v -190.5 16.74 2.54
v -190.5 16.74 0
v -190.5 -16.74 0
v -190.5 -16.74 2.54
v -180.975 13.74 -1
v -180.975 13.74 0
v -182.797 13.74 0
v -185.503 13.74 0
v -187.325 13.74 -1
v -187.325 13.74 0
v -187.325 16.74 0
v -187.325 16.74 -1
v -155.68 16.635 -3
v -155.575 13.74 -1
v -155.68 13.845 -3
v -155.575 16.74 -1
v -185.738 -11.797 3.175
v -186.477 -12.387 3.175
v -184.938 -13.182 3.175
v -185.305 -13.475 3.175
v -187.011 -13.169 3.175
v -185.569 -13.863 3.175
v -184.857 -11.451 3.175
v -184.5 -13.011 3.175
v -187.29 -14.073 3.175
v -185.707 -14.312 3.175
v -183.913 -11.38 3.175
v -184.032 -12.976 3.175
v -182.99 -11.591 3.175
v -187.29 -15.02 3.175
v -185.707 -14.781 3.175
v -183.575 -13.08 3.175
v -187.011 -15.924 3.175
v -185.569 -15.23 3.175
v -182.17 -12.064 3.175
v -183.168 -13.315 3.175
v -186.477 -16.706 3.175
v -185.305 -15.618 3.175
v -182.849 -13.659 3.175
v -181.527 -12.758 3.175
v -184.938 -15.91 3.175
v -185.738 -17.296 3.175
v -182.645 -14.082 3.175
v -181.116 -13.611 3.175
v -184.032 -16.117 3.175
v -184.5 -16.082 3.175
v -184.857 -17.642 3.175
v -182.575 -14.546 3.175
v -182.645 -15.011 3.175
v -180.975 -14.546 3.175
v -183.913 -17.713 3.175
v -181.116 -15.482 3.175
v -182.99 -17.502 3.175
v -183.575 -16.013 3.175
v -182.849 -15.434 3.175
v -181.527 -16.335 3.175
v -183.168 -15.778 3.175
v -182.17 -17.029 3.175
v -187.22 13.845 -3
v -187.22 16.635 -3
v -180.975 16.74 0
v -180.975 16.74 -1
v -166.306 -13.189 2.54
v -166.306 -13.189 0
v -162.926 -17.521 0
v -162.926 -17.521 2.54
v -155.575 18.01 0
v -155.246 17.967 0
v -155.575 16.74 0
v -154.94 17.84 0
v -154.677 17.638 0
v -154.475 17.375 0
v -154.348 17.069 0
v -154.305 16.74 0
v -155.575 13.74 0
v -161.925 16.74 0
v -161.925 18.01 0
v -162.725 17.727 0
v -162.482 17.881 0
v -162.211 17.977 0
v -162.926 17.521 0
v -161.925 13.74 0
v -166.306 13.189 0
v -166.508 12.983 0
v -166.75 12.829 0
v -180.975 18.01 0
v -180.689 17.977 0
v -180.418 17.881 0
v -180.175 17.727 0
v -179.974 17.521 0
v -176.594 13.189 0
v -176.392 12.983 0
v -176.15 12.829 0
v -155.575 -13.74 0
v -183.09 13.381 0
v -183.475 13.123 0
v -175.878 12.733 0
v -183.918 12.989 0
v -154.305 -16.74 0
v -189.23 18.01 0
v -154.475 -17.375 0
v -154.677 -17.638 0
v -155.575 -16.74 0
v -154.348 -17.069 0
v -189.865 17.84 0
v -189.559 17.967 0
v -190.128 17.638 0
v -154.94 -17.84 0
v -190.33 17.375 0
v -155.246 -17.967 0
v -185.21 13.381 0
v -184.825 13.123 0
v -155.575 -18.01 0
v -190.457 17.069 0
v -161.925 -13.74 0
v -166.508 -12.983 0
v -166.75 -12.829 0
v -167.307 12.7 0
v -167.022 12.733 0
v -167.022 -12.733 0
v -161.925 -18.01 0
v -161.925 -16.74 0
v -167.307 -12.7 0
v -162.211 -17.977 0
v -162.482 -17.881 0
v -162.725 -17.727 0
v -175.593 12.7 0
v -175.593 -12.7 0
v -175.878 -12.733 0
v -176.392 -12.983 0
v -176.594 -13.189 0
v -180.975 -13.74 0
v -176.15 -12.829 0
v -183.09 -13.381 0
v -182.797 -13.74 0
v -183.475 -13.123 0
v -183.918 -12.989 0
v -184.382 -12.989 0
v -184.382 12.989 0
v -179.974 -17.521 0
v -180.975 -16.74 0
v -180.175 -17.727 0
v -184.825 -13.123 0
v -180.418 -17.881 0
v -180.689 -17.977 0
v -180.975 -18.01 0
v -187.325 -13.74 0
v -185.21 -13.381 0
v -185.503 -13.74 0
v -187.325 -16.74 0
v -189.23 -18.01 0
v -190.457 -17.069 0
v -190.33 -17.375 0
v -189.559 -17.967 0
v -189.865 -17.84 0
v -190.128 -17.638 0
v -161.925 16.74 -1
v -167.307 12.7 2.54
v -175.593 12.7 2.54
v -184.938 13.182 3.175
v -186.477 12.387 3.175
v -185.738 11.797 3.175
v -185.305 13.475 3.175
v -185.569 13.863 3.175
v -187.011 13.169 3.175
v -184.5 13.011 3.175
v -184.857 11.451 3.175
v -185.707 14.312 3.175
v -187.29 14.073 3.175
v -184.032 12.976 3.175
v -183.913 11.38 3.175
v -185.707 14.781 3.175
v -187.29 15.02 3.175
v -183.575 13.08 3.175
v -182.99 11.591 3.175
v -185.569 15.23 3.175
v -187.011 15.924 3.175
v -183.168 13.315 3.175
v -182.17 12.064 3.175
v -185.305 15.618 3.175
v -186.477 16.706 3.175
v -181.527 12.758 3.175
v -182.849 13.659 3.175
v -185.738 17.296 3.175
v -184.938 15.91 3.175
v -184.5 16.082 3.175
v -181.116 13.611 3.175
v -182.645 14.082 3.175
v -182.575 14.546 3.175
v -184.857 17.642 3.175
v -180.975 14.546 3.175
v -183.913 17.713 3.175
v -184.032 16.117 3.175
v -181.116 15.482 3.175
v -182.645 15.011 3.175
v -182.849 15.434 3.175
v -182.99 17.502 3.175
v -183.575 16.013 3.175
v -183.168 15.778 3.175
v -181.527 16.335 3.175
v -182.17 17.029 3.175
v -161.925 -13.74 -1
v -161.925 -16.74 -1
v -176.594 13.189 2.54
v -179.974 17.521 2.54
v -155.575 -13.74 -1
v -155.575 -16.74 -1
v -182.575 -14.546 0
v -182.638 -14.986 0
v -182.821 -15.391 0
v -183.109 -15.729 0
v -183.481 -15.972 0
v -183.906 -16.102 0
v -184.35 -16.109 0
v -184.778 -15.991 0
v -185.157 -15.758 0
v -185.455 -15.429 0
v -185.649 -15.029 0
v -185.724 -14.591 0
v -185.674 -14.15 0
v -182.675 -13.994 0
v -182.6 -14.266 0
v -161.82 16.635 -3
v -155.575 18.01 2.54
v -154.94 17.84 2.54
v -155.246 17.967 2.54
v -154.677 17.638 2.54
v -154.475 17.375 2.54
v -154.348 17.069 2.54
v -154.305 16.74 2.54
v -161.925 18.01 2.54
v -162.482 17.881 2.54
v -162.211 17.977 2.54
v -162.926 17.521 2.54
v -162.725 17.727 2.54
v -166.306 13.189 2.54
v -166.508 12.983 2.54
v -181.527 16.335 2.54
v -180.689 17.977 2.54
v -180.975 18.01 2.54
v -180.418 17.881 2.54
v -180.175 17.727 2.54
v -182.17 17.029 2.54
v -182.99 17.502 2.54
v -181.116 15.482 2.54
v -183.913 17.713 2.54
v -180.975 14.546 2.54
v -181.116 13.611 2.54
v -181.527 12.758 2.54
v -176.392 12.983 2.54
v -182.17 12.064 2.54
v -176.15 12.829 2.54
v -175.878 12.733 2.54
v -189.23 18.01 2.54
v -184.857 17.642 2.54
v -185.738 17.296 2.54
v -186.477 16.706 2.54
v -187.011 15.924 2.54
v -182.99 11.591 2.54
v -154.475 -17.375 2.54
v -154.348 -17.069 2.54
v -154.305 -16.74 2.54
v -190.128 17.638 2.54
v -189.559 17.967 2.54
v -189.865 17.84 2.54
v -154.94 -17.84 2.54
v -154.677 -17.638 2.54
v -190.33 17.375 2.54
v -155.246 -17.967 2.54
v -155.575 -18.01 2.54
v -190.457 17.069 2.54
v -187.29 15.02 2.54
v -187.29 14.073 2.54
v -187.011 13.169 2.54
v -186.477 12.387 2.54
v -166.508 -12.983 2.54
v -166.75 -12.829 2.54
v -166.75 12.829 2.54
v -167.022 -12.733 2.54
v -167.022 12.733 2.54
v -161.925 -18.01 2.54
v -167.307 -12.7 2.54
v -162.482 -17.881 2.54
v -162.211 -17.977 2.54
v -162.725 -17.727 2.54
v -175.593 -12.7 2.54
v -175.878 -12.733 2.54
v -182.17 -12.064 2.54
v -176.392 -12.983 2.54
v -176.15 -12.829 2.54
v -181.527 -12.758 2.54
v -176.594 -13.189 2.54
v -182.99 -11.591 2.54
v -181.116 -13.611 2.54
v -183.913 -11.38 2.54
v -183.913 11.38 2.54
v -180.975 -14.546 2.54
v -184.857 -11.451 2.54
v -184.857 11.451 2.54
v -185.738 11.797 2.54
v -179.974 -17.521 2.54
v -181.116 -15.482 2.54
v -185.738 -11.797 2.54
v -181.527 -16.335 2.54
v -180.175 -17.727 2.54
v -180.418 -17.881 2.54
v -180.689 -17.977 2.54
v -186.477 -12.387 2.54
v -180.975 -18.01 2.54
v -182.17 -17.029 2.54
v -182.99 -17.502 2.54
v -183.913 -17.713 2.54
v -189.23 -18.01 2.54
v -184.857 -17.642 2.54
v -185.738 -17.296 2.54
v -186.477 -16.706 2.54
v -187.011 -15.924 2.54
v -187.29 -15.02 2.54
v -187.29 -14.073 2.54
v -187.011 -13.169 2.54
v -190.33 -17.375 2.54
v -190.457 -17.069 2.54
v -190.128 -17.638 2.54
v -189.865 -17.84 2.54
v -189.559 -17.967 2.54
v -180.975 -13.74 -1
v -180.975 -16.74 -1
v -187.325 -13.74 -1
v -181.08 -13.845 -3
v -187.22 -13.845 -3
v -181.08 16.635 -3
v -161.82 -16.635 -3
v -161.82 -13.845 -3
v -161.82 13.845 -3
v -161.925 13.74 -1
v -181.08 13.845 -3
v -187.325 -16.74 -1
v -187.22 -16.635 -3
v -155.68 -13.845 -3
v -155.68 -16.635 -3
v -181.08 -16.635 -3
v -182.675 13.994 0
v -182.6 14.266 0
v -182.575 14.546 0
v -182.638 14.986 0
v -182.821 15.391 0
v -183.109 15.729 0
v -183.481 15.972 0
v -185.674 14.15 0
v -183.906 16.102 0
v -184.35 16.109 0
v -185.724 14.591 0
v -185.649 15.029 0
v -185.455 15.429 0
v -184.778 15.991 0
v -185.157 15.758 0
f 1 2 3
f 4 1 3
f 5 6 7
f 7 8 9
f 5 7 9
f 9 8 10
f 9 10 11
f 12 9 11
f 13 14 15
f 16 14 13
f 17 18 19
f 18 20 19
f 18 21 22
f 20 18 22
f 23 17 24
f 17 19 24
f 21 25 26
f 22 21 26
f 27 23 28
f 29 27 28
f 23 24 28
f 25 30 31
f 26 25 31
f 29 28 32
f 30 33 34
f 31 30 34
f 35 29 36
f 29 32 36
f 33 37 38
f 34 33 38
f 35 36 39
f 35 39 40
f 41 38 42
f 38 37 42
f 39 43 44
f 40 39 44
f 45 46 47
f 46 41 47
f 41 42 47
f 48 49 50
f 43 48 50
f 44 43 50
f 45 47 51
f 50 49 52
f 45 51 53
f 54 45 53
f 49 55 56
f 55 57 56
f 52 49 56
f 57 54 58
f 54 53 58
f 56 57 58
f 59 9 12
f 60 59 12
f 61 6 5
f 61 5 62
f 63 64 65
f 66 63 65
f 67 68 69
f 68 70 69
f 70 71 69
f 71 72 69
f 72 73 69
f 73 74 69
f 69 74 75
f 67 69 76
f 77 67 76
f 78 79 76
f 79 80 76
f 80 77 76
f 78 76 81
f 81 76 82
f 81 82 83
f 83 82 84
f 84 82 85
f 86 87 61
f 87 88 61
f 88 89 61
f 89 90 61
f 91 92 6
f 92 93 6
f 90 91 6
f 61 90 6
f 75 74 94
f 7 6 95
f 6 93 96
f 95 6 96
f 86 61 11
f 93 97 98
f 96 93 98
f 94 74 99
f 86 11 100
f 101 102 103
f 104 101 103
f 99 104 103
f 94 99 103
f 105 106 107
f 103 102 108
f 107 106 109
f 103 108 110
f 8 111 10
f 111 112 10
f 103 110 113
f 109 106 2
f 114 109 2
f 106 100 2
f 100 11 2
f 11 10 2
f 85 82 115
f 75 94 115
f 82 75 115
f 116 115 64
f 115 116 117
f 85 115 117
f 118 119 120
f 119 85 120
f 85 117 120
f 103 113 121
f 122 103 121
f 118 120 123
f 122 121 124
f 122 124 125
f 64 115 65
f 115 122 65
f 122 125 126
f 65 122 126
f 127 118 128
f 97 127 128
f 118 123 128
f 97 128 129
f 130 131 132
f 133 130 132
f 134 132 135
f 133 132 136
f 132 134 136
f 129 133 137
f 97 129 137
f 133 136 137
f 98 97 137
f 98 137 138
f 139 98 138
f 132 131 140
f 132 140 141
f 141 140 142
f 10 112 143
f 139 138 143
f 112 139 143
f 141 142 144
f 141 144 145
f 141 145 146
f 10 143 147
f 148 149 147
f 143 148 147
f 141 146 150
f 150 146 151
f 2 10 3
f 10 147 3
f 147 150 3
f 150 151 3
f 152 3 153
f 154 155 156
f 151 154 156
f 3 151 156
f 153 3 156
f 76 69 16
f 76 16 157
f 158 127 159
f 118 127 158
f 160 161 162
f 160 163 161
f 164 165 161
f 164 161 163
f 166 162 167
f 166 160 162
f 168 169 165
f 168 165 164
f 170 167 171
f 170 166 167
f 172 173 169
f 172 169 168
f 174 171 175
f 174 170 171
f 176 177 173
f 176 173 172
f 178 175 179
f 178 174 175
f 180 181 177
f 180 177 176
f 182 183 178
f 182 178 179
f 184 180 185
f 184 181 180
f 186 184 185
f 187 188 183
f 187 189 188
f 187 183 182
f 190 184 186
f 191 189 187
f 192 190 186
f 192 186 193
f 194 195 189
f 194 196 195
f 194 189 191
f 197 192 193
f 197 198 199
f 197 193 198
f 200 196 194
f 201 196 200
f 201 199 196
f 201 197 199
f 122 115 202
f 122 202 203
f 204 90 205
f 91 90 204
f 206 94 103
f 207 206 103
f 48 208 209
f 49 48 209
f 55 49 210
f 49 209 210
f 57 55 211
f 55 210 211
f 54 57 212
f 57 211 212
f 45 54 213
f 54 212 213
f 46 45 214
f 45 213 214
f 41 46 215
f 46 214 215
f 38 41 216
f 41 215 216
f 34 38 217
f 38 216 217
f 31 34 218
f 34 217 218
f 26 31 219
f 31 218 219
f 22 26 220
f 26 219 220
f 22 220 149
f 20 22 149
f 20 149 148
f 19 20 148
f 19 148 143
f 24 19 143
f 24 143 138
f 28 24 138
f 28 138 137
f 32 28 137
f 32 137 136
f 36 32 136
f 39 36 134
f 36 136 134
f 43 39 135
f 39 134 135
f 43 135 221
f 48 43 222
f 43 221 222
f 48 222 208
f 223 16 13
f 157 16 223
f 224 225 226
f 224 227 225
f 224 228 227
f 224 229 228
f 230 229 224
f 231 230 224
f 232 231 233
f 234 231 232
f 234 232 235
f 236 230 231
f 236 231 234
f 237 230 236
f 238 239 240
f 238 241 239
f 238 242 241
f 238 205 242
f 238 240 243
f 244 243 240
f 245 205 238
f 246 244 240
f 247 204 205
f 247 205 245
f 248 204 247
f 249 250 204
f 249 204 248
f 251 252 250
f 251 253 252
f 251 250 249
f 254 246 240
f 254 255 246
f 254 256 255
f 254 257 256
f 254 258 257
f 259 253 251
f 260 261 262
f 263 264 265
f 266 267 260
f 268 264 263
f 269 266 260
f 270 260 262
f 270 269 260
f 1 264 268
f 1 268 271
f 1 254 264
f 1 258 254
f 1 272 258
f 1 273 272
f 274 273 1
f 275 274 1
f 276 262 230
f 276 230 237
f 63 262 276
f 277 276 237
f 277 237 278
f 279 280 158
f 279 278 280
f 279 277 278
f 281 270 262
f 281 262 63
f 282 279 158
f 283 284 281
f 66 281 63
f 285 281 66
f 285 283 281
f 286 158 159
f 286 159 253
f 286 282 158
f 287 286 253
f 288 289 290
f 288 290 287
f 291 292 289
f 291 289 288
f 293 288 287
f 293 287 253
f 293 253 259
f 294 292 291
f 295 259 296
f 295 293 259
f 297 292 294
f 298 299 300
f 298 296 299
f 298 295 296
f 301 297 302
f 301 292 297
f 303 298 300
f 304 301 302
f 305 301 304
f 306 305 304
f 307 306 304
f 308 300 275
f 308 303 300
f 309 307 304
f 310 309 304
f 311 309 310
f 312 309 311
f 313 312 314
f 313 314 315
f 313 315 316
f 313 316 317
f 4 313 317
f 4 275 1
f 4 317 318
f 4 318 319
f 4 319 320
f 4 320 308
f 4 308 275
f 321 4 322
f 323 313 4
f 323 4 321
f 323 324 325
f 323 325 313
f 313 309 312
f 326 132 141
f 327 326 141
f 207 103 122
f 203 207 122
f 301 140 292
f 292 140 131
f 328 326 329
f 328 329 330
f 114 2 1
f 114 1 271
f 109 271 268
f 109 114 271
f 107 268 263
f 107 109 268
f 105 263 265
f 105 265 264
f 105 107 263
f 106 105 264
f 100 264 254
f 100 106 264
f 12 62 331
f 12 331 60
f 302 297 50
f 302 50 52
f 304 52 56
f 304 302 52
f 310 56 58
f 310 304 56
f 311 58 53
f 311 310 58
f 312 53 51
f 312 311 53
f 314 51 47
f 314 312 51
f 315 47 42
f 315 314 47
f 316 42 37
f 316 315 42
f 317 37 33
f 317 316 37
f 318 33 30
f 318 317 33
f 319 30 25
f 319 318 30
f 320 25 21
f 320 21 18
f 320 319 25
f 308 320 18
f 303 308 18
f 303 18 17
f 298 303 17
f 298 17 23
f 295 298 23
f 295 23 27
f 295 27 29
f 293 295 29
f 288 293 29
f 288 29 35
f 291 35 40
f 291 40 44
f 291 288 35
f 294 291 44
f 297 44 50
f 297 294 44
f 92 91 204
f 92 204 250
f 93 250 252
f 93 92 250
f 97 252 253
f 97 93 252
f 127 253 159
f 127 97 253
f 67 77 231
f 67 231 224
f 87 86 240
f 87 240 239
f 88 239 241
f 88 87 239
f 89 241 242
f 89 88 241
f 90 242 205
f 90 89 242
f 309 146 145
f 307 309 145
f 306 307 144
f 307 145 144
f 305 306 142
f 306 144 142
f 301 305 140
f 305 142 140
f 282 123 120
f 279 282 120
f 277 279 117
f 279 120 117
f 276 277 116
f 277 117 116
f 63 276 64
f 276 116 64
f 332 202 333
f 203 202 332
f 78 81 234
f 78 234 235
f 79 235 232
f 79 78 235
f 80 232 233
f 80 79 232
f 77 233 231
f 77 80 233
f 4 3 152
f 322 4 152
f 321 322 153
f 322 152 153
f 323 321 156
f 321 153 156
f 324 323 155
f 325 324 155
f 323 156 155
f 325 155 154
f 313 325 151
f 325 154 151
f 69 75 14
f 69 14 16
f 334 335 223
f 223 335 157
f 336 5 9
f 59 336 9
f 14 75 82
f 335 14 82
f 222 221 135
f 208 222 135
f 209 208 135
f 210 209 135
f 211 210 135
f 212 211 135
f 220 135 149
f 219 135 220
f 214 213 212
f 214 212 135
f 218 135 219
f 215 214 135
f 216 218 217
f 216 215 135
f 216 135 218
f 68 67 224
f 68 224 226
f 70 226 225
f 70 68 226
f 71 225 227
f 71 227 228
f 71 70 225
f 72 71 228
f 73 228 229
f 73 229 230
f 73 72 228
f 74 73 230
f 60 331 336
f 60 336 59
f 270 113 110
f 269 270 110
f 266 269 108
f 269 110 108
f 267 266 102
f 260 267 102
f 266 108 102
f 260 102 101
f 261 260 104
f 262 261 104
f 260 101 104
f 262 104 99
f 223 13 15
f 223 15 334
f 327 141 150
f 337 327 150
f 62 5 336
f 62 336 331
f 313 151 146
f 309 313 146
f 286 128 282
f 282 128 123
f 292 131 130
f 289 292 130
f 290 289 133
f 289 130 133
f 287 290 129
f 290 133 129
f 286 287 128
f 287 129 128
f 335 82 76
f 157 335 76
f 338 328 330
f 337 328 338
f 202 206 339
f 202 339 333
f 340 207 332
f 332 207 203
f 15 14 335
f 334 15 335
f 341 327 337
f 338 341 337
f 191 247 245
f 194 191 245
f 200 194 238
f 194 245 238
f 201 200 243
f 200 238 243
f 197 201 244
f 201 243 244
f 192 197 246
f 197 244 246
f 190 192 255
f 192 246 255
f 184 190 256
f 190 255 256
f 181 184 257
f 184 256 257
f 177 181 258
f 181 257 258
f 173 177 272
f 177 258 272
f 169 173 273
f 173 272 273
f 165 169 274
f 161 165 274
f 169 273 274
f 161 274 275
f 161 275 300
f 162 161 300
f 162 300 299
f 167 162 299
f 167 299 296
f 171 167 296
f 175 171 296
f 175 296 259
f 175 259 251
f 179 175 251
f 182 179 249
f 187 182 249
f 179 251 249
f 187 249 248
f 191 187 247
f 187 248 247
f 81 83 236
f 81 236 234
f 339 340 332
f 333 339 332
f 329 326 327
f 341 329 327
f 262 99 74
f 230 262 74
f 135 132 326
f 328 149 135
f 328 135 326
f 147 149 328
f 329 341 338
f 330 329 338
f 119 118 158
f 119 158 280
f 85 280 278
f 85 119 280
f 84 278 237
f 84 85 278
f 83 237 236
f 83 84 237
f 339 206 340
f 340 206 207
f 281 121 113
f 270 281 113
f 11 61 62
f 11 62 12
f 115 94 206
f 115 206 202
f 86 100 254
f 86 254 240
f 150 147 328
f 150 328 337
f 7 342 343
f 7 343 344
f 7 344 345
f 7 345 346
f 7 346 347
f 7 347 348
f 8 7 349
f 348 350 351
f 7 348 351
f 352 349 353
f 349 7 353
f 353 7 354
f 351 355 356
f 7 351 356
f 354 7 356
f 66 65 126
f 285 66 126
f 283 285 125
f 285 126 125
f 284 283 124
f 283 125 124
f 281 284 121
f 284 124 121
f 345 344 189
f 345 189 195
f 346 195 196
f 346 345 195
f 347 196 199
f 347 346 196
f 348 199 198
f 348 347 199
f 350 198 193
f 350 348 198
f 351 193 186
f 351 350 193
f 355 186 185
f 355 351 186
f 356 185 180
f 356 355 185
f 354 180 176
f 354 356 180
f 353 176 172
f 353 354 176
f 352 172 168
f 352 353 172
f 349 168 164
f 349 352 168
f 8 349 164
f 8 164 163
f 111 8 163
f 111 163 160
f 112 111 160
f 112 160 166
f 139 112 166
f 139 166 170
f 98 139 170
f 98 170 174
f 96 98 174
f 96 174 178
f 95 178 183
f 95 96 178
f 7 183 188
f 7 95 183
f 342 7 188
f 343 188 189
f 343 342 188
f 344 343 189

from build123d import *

# Parameters (mm, degrees)
SKETCH1_R                     = 1.575
BOSS_EXTRUDE1_DEPTH           = 2.54
SKETCH2_R                     = 3.175
SKETCH2_R_2                   = 1.575
BOSS_EXTRUDE2_DEPTH           = 0.635
SKETCH3_W                     = 6.35
SKETCH3_H                     = 3
BOSS_EXTRUDE3_DEPTH           = 1
SKETCH4_W                     = 6.35
SKETCH4_H                     = 3
BOSS_EXTRUDE4_DEPTH           = 2
BOSS_EXTRUDE4_DRAFT           = 3
BOSS_EXTRUDE4_PROFILE_2_DEPTH = 2
BOSS_EXTRUDE4_PROFILE_2_DRAFT = 3


with BuildPart() as part:
    # Sketch1 → Boss-Extrude1 (new body)
    with BuildSketch(Plane.XY):
        with BuildLine():
            Line((-184.15, 18.01), (-180.975, 18.01))
            ThreePointArc((-180.975, 18.01), (-180.417860718, 17.88126939), (-179.973667703, 17.521174521))
            Line((-179.973667703, 17.521174521), (-176.593849938, 13.188825479))
            ThreePointArc((-176.593849938, 13.188825479), (-176.149656923, 12.82873061), (-175.592517642, 12.7))
            Line((-175.592517642, 12.7), (-167.307482358, 12.7))
            ThreePointArc((-167.307482358, 12.7), (-166.750343077, 12.82873061), (-166.306150062, 13.188825479))
            Line((-166.306150062, 13.188825479), (-162.926332297, 17.521174521))
            ThreePointArc((-162.926332297, 17.521174521), (-162.482139282, 17.88126939), (-161.925, 18.01))
            Line((-161.925, 18.01), (-155.575, 18.01))
            ThreePointArc((-155.575, 18.01), (-154.676974388, 17.638025612), (-154.305, 16.74))
            Line((-154.305, 16.74), (-154.305, 0))
            Line((-154.305, 0), (-190.5, 0))
            Line((-190.5, 0), (-190.5, 16.74))
            ThreePointArc((-190.5, 16.74), (-190.128025612, 17.638025612), (-189.23, 18.01))
            Line((-189.23, 18.01), (-184.15, 18.01))
        make_face()
        with Locations((-184.15, 14.54645)):
            Circle(SKETCH1_R, mode=Mode.SUBTRACT)
    extrude(amount=BOSS_EXTRUDE1_DEPTH)

    # Sketch2 → Boss-Extrude2 (add)
    with BuildSketch(Plane.XY.offset(2.54)):
        with Locations((-184.15, 14.54645)):
            Circle(SKETCH2_R)
        with Locations((-184.15, 14.54645)):
            Circle(SKETCH2_R_2, mode=Mode.SUBTRACT)
    extrude(amount=BOSS_EXTRUDE2_DEPTH)

    # Sketch3 → Boss-Extrude3 (add)
    with BuildSketch(Plane(origin=(0, 0, 0), x_dir=(-1, 0, 0), z_dir=(0, 0, -1))):
        with Locations((184.15, 15.24)):
            Rectangle(SKETCH3_W, SKETCH3_H)
        with Locations((158.75, 15.24)):
            Rectangle(SKETCH3_W, SKETCH3_H)
    extrude(amount=BOSS_EXTRUDE3_DEPTH)


with BuildPart() as boss_extrude4_tool:
    # Sketch4 → Boss-Extrude4 (with draft: the straight prism first)
    with BuildSketch(Plane(origin=(0, 0, -1), x_dir=(-1, 0, 0), z_dir=(0, 0, -1))):
        with Locations((184.15, 15.24)):
            Rectangle(SKETCH4_W, SKETCH4_H)
    extrude(amount=BOSS_EXTRUDE4_DEPTH)
    # Boss-Extrude4: the draft: its side faces are tilted about the plane it starts from
    boss_extrude4_sides = [boss_extrude4_tool.faces().sort_by_distance(p)[0] for p in [
        (-180.975, 15.24, -2),
        (-184.15, 13.74, -2),
        (-187.325, 15.24, -2),
        (-184.15, 16.74, -2),
    ]]
    draft(boss_extrude4_sides, Plane(origin=(0, 0, -1), x_dir=(-1, 0, 0), z_dir=(0, 0, -1)), BOSS_EXTRUDE4_DRAFT)


with BuildPart() as part_1:
    add(part.part)

    # Boss-Extrude4: add boss_extrude4_tool
    add(boss_extrude4_tool.part)


with BuildPart() as boss_extrude4_profile_2_tool:
    # Sketch4 → Boss-Extrude4 profile 2 (with draft: the straight prism first)
    with BuildSketch(Plane(origin=(0, 0, -1), x_dir=(-1, 0, 0), z_dir=(0, 0, -1))):
        with Locations((158.75, 15.24)):
            Rectangle(SKETCH4_W, SKETCH4_H)
    extrude(amount=BOSS_EXTRUDE4_PROFILE_2_DEPTH)
    # Boss-Extrude4 profile 2: the draft: its side faces are tilted about the plane it starts from
    boss_extrude4_profile_2_sides = [boss_extrude4_profile_2_tool.faces().sort_by_distance(p)[0] for p in [
        (-155.575, 15.24, -2),
        (-158.75, 13.74, -2),
        (-161.925, 15.24, -2),
        (-158.75, 16.74, -2),
    ]]
    draft(boss_extrude4_profile_2_sides, Plane(origin=(0, 0, -1), x_dir=(-1, 0, 0), z_dir=(0, 0, -1)), BOSS_EXTRUDE4_PROFILE_2_DRAFT)


with BuildPart() as part_2:
    add(part_1.part)

    # Boss-Extrude4 profile 2: add boss_extrude4_profile_2_tool
    add(boss_extrude4_profile_2_tool.part)

    # Mirror1: part across plane


with BuildPart() as part_3:
    add(part_2.part)
    add(part_2.part.mirror(Plane.ZX))


solid = part_3.part
